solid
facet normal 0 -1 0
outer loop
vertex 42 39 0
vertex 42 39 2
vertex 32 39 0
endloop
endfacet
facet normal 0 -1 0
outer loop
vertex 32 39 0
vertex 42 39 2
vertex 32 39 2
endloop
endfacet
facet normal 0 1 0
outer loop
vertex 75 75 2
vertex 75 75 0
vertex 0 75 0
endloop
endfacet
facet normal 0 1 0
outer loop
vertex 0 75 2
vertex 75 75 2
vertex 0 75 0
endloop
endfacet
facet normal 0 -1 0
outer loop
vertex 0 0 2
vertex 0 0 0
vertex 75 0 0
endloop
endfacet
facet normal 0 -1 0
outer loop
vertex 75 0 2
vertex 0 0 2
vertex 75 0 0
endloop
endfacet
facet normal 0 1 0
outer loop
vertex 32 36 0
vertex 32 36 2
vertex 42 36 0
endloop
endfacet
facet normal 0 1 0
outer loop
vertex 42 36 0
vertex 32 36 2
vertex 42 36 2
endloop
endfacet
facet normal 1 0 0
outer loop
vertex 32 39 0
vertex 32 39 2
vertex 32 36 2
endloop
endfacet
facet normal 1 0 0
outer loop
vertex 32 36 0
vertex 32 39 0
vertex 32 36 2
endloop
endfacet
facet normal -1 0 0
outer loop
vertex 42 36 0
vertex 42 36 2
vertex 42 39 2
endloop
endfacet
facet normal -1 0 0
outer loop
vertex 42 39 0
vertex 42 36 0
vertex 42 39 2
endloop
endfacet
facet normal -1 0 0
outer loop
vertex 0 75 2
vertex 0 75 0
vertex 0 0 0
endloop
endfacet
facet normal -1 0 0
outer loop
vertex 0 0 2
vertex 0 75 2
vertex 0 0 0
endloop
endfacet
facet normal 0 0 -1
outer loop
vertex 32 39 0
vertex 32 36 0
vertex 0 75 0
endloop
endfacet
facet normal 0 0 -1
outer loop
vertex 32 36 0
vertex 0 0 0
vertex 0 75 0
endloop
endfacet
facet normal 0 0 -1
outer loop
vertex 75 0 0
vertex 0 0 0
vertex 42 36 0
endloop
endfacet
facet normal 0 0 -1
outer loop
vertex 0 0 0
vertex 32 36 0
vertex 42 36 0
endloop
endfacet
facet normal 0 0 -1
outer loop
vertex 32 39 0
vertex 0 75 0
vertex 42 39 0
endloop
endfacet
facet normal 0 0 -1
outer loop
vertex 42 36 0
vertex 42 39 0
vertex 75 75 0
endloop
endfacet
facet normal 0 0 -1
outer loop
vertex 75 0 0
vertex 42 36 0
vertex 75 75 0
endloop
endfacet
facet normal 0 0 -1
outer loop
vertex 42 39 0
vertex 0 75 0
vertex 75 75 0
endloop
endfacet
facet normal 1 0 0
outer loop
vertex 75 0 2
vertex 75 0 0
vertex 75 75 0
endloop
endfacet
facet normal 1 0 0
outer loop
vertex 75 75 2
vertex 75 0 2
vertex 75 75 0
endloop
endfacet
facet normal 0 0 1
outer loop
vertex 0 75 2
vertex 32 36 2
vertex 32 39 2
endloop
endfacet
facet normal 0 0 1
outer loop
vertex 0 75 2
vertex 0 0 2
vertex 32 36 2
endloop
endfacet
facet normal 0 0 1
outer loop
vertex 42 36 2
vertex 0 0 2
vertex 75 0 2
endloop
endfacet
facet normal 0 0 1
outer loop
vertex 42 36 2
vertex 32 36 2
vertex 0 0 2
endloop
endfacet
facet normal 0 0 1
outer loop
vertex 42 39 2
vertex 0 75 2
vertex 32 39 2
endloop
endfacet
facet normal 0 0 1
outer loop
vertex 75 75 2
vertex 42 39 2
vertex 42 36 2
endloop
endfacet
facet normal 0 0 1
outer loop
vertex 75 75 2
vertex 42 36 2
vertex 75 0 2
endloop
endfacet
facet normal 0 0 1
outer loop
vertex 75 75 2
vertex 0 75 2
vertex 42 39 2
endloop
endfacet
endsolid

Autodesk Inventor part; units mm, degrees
ref_plane "YZ Plane" through (0, 0, 0) normal (1, 0, 0) x (0, 1, 0)
ref_plane "XZ Plane" through (0, 0, 0) normal (0, 1, 0) x (-1, 0, 0)
ref_plane "XY Plane" through (0, 0, 0) normal (0, 0, 1) x (1, 0, 0)
sketch "Esquisse1" plane through (0, 0, 0) normal (0, 0, 1) x (1, 0, 0)
  line L0 (0, 0) -> (75, 0)
  line L1 (75, 0) -> (75, 75)
  line L2 (75, 75) -> (0, 75)
  line L3 (0, 75) -> (0, 0)
  dimension "d0" = 75
  dimension "d1" = 75
extrude "Extrusion1" add sketch "Esquisse1" along normal blind 2
sketch "Esquisse2" plane through (0, 0, 2) normal (0, 0, 1) x (1, 0, 0)
  line L0 (32, 36) -> (42, 36)
  line L1 (42, 36) -> (42, 39)
  line L2 (42, 39) -> (32, 39)
  line L3 (32, 39) -> (32, 36)
  line L4 (0, 0) -> (75, 0) projected
  line L5 (0, 75) -> (0, 0) projected
  dimension "d4" = 10
  dimension "d5" = 3
  dimension "d6" = 36
  dimension "d7" = 32
extrude "Extrusion2" cut sketch "Esquisse2" against normal blind 2
properties part number "Pièce-moteur-vis_CPY"
